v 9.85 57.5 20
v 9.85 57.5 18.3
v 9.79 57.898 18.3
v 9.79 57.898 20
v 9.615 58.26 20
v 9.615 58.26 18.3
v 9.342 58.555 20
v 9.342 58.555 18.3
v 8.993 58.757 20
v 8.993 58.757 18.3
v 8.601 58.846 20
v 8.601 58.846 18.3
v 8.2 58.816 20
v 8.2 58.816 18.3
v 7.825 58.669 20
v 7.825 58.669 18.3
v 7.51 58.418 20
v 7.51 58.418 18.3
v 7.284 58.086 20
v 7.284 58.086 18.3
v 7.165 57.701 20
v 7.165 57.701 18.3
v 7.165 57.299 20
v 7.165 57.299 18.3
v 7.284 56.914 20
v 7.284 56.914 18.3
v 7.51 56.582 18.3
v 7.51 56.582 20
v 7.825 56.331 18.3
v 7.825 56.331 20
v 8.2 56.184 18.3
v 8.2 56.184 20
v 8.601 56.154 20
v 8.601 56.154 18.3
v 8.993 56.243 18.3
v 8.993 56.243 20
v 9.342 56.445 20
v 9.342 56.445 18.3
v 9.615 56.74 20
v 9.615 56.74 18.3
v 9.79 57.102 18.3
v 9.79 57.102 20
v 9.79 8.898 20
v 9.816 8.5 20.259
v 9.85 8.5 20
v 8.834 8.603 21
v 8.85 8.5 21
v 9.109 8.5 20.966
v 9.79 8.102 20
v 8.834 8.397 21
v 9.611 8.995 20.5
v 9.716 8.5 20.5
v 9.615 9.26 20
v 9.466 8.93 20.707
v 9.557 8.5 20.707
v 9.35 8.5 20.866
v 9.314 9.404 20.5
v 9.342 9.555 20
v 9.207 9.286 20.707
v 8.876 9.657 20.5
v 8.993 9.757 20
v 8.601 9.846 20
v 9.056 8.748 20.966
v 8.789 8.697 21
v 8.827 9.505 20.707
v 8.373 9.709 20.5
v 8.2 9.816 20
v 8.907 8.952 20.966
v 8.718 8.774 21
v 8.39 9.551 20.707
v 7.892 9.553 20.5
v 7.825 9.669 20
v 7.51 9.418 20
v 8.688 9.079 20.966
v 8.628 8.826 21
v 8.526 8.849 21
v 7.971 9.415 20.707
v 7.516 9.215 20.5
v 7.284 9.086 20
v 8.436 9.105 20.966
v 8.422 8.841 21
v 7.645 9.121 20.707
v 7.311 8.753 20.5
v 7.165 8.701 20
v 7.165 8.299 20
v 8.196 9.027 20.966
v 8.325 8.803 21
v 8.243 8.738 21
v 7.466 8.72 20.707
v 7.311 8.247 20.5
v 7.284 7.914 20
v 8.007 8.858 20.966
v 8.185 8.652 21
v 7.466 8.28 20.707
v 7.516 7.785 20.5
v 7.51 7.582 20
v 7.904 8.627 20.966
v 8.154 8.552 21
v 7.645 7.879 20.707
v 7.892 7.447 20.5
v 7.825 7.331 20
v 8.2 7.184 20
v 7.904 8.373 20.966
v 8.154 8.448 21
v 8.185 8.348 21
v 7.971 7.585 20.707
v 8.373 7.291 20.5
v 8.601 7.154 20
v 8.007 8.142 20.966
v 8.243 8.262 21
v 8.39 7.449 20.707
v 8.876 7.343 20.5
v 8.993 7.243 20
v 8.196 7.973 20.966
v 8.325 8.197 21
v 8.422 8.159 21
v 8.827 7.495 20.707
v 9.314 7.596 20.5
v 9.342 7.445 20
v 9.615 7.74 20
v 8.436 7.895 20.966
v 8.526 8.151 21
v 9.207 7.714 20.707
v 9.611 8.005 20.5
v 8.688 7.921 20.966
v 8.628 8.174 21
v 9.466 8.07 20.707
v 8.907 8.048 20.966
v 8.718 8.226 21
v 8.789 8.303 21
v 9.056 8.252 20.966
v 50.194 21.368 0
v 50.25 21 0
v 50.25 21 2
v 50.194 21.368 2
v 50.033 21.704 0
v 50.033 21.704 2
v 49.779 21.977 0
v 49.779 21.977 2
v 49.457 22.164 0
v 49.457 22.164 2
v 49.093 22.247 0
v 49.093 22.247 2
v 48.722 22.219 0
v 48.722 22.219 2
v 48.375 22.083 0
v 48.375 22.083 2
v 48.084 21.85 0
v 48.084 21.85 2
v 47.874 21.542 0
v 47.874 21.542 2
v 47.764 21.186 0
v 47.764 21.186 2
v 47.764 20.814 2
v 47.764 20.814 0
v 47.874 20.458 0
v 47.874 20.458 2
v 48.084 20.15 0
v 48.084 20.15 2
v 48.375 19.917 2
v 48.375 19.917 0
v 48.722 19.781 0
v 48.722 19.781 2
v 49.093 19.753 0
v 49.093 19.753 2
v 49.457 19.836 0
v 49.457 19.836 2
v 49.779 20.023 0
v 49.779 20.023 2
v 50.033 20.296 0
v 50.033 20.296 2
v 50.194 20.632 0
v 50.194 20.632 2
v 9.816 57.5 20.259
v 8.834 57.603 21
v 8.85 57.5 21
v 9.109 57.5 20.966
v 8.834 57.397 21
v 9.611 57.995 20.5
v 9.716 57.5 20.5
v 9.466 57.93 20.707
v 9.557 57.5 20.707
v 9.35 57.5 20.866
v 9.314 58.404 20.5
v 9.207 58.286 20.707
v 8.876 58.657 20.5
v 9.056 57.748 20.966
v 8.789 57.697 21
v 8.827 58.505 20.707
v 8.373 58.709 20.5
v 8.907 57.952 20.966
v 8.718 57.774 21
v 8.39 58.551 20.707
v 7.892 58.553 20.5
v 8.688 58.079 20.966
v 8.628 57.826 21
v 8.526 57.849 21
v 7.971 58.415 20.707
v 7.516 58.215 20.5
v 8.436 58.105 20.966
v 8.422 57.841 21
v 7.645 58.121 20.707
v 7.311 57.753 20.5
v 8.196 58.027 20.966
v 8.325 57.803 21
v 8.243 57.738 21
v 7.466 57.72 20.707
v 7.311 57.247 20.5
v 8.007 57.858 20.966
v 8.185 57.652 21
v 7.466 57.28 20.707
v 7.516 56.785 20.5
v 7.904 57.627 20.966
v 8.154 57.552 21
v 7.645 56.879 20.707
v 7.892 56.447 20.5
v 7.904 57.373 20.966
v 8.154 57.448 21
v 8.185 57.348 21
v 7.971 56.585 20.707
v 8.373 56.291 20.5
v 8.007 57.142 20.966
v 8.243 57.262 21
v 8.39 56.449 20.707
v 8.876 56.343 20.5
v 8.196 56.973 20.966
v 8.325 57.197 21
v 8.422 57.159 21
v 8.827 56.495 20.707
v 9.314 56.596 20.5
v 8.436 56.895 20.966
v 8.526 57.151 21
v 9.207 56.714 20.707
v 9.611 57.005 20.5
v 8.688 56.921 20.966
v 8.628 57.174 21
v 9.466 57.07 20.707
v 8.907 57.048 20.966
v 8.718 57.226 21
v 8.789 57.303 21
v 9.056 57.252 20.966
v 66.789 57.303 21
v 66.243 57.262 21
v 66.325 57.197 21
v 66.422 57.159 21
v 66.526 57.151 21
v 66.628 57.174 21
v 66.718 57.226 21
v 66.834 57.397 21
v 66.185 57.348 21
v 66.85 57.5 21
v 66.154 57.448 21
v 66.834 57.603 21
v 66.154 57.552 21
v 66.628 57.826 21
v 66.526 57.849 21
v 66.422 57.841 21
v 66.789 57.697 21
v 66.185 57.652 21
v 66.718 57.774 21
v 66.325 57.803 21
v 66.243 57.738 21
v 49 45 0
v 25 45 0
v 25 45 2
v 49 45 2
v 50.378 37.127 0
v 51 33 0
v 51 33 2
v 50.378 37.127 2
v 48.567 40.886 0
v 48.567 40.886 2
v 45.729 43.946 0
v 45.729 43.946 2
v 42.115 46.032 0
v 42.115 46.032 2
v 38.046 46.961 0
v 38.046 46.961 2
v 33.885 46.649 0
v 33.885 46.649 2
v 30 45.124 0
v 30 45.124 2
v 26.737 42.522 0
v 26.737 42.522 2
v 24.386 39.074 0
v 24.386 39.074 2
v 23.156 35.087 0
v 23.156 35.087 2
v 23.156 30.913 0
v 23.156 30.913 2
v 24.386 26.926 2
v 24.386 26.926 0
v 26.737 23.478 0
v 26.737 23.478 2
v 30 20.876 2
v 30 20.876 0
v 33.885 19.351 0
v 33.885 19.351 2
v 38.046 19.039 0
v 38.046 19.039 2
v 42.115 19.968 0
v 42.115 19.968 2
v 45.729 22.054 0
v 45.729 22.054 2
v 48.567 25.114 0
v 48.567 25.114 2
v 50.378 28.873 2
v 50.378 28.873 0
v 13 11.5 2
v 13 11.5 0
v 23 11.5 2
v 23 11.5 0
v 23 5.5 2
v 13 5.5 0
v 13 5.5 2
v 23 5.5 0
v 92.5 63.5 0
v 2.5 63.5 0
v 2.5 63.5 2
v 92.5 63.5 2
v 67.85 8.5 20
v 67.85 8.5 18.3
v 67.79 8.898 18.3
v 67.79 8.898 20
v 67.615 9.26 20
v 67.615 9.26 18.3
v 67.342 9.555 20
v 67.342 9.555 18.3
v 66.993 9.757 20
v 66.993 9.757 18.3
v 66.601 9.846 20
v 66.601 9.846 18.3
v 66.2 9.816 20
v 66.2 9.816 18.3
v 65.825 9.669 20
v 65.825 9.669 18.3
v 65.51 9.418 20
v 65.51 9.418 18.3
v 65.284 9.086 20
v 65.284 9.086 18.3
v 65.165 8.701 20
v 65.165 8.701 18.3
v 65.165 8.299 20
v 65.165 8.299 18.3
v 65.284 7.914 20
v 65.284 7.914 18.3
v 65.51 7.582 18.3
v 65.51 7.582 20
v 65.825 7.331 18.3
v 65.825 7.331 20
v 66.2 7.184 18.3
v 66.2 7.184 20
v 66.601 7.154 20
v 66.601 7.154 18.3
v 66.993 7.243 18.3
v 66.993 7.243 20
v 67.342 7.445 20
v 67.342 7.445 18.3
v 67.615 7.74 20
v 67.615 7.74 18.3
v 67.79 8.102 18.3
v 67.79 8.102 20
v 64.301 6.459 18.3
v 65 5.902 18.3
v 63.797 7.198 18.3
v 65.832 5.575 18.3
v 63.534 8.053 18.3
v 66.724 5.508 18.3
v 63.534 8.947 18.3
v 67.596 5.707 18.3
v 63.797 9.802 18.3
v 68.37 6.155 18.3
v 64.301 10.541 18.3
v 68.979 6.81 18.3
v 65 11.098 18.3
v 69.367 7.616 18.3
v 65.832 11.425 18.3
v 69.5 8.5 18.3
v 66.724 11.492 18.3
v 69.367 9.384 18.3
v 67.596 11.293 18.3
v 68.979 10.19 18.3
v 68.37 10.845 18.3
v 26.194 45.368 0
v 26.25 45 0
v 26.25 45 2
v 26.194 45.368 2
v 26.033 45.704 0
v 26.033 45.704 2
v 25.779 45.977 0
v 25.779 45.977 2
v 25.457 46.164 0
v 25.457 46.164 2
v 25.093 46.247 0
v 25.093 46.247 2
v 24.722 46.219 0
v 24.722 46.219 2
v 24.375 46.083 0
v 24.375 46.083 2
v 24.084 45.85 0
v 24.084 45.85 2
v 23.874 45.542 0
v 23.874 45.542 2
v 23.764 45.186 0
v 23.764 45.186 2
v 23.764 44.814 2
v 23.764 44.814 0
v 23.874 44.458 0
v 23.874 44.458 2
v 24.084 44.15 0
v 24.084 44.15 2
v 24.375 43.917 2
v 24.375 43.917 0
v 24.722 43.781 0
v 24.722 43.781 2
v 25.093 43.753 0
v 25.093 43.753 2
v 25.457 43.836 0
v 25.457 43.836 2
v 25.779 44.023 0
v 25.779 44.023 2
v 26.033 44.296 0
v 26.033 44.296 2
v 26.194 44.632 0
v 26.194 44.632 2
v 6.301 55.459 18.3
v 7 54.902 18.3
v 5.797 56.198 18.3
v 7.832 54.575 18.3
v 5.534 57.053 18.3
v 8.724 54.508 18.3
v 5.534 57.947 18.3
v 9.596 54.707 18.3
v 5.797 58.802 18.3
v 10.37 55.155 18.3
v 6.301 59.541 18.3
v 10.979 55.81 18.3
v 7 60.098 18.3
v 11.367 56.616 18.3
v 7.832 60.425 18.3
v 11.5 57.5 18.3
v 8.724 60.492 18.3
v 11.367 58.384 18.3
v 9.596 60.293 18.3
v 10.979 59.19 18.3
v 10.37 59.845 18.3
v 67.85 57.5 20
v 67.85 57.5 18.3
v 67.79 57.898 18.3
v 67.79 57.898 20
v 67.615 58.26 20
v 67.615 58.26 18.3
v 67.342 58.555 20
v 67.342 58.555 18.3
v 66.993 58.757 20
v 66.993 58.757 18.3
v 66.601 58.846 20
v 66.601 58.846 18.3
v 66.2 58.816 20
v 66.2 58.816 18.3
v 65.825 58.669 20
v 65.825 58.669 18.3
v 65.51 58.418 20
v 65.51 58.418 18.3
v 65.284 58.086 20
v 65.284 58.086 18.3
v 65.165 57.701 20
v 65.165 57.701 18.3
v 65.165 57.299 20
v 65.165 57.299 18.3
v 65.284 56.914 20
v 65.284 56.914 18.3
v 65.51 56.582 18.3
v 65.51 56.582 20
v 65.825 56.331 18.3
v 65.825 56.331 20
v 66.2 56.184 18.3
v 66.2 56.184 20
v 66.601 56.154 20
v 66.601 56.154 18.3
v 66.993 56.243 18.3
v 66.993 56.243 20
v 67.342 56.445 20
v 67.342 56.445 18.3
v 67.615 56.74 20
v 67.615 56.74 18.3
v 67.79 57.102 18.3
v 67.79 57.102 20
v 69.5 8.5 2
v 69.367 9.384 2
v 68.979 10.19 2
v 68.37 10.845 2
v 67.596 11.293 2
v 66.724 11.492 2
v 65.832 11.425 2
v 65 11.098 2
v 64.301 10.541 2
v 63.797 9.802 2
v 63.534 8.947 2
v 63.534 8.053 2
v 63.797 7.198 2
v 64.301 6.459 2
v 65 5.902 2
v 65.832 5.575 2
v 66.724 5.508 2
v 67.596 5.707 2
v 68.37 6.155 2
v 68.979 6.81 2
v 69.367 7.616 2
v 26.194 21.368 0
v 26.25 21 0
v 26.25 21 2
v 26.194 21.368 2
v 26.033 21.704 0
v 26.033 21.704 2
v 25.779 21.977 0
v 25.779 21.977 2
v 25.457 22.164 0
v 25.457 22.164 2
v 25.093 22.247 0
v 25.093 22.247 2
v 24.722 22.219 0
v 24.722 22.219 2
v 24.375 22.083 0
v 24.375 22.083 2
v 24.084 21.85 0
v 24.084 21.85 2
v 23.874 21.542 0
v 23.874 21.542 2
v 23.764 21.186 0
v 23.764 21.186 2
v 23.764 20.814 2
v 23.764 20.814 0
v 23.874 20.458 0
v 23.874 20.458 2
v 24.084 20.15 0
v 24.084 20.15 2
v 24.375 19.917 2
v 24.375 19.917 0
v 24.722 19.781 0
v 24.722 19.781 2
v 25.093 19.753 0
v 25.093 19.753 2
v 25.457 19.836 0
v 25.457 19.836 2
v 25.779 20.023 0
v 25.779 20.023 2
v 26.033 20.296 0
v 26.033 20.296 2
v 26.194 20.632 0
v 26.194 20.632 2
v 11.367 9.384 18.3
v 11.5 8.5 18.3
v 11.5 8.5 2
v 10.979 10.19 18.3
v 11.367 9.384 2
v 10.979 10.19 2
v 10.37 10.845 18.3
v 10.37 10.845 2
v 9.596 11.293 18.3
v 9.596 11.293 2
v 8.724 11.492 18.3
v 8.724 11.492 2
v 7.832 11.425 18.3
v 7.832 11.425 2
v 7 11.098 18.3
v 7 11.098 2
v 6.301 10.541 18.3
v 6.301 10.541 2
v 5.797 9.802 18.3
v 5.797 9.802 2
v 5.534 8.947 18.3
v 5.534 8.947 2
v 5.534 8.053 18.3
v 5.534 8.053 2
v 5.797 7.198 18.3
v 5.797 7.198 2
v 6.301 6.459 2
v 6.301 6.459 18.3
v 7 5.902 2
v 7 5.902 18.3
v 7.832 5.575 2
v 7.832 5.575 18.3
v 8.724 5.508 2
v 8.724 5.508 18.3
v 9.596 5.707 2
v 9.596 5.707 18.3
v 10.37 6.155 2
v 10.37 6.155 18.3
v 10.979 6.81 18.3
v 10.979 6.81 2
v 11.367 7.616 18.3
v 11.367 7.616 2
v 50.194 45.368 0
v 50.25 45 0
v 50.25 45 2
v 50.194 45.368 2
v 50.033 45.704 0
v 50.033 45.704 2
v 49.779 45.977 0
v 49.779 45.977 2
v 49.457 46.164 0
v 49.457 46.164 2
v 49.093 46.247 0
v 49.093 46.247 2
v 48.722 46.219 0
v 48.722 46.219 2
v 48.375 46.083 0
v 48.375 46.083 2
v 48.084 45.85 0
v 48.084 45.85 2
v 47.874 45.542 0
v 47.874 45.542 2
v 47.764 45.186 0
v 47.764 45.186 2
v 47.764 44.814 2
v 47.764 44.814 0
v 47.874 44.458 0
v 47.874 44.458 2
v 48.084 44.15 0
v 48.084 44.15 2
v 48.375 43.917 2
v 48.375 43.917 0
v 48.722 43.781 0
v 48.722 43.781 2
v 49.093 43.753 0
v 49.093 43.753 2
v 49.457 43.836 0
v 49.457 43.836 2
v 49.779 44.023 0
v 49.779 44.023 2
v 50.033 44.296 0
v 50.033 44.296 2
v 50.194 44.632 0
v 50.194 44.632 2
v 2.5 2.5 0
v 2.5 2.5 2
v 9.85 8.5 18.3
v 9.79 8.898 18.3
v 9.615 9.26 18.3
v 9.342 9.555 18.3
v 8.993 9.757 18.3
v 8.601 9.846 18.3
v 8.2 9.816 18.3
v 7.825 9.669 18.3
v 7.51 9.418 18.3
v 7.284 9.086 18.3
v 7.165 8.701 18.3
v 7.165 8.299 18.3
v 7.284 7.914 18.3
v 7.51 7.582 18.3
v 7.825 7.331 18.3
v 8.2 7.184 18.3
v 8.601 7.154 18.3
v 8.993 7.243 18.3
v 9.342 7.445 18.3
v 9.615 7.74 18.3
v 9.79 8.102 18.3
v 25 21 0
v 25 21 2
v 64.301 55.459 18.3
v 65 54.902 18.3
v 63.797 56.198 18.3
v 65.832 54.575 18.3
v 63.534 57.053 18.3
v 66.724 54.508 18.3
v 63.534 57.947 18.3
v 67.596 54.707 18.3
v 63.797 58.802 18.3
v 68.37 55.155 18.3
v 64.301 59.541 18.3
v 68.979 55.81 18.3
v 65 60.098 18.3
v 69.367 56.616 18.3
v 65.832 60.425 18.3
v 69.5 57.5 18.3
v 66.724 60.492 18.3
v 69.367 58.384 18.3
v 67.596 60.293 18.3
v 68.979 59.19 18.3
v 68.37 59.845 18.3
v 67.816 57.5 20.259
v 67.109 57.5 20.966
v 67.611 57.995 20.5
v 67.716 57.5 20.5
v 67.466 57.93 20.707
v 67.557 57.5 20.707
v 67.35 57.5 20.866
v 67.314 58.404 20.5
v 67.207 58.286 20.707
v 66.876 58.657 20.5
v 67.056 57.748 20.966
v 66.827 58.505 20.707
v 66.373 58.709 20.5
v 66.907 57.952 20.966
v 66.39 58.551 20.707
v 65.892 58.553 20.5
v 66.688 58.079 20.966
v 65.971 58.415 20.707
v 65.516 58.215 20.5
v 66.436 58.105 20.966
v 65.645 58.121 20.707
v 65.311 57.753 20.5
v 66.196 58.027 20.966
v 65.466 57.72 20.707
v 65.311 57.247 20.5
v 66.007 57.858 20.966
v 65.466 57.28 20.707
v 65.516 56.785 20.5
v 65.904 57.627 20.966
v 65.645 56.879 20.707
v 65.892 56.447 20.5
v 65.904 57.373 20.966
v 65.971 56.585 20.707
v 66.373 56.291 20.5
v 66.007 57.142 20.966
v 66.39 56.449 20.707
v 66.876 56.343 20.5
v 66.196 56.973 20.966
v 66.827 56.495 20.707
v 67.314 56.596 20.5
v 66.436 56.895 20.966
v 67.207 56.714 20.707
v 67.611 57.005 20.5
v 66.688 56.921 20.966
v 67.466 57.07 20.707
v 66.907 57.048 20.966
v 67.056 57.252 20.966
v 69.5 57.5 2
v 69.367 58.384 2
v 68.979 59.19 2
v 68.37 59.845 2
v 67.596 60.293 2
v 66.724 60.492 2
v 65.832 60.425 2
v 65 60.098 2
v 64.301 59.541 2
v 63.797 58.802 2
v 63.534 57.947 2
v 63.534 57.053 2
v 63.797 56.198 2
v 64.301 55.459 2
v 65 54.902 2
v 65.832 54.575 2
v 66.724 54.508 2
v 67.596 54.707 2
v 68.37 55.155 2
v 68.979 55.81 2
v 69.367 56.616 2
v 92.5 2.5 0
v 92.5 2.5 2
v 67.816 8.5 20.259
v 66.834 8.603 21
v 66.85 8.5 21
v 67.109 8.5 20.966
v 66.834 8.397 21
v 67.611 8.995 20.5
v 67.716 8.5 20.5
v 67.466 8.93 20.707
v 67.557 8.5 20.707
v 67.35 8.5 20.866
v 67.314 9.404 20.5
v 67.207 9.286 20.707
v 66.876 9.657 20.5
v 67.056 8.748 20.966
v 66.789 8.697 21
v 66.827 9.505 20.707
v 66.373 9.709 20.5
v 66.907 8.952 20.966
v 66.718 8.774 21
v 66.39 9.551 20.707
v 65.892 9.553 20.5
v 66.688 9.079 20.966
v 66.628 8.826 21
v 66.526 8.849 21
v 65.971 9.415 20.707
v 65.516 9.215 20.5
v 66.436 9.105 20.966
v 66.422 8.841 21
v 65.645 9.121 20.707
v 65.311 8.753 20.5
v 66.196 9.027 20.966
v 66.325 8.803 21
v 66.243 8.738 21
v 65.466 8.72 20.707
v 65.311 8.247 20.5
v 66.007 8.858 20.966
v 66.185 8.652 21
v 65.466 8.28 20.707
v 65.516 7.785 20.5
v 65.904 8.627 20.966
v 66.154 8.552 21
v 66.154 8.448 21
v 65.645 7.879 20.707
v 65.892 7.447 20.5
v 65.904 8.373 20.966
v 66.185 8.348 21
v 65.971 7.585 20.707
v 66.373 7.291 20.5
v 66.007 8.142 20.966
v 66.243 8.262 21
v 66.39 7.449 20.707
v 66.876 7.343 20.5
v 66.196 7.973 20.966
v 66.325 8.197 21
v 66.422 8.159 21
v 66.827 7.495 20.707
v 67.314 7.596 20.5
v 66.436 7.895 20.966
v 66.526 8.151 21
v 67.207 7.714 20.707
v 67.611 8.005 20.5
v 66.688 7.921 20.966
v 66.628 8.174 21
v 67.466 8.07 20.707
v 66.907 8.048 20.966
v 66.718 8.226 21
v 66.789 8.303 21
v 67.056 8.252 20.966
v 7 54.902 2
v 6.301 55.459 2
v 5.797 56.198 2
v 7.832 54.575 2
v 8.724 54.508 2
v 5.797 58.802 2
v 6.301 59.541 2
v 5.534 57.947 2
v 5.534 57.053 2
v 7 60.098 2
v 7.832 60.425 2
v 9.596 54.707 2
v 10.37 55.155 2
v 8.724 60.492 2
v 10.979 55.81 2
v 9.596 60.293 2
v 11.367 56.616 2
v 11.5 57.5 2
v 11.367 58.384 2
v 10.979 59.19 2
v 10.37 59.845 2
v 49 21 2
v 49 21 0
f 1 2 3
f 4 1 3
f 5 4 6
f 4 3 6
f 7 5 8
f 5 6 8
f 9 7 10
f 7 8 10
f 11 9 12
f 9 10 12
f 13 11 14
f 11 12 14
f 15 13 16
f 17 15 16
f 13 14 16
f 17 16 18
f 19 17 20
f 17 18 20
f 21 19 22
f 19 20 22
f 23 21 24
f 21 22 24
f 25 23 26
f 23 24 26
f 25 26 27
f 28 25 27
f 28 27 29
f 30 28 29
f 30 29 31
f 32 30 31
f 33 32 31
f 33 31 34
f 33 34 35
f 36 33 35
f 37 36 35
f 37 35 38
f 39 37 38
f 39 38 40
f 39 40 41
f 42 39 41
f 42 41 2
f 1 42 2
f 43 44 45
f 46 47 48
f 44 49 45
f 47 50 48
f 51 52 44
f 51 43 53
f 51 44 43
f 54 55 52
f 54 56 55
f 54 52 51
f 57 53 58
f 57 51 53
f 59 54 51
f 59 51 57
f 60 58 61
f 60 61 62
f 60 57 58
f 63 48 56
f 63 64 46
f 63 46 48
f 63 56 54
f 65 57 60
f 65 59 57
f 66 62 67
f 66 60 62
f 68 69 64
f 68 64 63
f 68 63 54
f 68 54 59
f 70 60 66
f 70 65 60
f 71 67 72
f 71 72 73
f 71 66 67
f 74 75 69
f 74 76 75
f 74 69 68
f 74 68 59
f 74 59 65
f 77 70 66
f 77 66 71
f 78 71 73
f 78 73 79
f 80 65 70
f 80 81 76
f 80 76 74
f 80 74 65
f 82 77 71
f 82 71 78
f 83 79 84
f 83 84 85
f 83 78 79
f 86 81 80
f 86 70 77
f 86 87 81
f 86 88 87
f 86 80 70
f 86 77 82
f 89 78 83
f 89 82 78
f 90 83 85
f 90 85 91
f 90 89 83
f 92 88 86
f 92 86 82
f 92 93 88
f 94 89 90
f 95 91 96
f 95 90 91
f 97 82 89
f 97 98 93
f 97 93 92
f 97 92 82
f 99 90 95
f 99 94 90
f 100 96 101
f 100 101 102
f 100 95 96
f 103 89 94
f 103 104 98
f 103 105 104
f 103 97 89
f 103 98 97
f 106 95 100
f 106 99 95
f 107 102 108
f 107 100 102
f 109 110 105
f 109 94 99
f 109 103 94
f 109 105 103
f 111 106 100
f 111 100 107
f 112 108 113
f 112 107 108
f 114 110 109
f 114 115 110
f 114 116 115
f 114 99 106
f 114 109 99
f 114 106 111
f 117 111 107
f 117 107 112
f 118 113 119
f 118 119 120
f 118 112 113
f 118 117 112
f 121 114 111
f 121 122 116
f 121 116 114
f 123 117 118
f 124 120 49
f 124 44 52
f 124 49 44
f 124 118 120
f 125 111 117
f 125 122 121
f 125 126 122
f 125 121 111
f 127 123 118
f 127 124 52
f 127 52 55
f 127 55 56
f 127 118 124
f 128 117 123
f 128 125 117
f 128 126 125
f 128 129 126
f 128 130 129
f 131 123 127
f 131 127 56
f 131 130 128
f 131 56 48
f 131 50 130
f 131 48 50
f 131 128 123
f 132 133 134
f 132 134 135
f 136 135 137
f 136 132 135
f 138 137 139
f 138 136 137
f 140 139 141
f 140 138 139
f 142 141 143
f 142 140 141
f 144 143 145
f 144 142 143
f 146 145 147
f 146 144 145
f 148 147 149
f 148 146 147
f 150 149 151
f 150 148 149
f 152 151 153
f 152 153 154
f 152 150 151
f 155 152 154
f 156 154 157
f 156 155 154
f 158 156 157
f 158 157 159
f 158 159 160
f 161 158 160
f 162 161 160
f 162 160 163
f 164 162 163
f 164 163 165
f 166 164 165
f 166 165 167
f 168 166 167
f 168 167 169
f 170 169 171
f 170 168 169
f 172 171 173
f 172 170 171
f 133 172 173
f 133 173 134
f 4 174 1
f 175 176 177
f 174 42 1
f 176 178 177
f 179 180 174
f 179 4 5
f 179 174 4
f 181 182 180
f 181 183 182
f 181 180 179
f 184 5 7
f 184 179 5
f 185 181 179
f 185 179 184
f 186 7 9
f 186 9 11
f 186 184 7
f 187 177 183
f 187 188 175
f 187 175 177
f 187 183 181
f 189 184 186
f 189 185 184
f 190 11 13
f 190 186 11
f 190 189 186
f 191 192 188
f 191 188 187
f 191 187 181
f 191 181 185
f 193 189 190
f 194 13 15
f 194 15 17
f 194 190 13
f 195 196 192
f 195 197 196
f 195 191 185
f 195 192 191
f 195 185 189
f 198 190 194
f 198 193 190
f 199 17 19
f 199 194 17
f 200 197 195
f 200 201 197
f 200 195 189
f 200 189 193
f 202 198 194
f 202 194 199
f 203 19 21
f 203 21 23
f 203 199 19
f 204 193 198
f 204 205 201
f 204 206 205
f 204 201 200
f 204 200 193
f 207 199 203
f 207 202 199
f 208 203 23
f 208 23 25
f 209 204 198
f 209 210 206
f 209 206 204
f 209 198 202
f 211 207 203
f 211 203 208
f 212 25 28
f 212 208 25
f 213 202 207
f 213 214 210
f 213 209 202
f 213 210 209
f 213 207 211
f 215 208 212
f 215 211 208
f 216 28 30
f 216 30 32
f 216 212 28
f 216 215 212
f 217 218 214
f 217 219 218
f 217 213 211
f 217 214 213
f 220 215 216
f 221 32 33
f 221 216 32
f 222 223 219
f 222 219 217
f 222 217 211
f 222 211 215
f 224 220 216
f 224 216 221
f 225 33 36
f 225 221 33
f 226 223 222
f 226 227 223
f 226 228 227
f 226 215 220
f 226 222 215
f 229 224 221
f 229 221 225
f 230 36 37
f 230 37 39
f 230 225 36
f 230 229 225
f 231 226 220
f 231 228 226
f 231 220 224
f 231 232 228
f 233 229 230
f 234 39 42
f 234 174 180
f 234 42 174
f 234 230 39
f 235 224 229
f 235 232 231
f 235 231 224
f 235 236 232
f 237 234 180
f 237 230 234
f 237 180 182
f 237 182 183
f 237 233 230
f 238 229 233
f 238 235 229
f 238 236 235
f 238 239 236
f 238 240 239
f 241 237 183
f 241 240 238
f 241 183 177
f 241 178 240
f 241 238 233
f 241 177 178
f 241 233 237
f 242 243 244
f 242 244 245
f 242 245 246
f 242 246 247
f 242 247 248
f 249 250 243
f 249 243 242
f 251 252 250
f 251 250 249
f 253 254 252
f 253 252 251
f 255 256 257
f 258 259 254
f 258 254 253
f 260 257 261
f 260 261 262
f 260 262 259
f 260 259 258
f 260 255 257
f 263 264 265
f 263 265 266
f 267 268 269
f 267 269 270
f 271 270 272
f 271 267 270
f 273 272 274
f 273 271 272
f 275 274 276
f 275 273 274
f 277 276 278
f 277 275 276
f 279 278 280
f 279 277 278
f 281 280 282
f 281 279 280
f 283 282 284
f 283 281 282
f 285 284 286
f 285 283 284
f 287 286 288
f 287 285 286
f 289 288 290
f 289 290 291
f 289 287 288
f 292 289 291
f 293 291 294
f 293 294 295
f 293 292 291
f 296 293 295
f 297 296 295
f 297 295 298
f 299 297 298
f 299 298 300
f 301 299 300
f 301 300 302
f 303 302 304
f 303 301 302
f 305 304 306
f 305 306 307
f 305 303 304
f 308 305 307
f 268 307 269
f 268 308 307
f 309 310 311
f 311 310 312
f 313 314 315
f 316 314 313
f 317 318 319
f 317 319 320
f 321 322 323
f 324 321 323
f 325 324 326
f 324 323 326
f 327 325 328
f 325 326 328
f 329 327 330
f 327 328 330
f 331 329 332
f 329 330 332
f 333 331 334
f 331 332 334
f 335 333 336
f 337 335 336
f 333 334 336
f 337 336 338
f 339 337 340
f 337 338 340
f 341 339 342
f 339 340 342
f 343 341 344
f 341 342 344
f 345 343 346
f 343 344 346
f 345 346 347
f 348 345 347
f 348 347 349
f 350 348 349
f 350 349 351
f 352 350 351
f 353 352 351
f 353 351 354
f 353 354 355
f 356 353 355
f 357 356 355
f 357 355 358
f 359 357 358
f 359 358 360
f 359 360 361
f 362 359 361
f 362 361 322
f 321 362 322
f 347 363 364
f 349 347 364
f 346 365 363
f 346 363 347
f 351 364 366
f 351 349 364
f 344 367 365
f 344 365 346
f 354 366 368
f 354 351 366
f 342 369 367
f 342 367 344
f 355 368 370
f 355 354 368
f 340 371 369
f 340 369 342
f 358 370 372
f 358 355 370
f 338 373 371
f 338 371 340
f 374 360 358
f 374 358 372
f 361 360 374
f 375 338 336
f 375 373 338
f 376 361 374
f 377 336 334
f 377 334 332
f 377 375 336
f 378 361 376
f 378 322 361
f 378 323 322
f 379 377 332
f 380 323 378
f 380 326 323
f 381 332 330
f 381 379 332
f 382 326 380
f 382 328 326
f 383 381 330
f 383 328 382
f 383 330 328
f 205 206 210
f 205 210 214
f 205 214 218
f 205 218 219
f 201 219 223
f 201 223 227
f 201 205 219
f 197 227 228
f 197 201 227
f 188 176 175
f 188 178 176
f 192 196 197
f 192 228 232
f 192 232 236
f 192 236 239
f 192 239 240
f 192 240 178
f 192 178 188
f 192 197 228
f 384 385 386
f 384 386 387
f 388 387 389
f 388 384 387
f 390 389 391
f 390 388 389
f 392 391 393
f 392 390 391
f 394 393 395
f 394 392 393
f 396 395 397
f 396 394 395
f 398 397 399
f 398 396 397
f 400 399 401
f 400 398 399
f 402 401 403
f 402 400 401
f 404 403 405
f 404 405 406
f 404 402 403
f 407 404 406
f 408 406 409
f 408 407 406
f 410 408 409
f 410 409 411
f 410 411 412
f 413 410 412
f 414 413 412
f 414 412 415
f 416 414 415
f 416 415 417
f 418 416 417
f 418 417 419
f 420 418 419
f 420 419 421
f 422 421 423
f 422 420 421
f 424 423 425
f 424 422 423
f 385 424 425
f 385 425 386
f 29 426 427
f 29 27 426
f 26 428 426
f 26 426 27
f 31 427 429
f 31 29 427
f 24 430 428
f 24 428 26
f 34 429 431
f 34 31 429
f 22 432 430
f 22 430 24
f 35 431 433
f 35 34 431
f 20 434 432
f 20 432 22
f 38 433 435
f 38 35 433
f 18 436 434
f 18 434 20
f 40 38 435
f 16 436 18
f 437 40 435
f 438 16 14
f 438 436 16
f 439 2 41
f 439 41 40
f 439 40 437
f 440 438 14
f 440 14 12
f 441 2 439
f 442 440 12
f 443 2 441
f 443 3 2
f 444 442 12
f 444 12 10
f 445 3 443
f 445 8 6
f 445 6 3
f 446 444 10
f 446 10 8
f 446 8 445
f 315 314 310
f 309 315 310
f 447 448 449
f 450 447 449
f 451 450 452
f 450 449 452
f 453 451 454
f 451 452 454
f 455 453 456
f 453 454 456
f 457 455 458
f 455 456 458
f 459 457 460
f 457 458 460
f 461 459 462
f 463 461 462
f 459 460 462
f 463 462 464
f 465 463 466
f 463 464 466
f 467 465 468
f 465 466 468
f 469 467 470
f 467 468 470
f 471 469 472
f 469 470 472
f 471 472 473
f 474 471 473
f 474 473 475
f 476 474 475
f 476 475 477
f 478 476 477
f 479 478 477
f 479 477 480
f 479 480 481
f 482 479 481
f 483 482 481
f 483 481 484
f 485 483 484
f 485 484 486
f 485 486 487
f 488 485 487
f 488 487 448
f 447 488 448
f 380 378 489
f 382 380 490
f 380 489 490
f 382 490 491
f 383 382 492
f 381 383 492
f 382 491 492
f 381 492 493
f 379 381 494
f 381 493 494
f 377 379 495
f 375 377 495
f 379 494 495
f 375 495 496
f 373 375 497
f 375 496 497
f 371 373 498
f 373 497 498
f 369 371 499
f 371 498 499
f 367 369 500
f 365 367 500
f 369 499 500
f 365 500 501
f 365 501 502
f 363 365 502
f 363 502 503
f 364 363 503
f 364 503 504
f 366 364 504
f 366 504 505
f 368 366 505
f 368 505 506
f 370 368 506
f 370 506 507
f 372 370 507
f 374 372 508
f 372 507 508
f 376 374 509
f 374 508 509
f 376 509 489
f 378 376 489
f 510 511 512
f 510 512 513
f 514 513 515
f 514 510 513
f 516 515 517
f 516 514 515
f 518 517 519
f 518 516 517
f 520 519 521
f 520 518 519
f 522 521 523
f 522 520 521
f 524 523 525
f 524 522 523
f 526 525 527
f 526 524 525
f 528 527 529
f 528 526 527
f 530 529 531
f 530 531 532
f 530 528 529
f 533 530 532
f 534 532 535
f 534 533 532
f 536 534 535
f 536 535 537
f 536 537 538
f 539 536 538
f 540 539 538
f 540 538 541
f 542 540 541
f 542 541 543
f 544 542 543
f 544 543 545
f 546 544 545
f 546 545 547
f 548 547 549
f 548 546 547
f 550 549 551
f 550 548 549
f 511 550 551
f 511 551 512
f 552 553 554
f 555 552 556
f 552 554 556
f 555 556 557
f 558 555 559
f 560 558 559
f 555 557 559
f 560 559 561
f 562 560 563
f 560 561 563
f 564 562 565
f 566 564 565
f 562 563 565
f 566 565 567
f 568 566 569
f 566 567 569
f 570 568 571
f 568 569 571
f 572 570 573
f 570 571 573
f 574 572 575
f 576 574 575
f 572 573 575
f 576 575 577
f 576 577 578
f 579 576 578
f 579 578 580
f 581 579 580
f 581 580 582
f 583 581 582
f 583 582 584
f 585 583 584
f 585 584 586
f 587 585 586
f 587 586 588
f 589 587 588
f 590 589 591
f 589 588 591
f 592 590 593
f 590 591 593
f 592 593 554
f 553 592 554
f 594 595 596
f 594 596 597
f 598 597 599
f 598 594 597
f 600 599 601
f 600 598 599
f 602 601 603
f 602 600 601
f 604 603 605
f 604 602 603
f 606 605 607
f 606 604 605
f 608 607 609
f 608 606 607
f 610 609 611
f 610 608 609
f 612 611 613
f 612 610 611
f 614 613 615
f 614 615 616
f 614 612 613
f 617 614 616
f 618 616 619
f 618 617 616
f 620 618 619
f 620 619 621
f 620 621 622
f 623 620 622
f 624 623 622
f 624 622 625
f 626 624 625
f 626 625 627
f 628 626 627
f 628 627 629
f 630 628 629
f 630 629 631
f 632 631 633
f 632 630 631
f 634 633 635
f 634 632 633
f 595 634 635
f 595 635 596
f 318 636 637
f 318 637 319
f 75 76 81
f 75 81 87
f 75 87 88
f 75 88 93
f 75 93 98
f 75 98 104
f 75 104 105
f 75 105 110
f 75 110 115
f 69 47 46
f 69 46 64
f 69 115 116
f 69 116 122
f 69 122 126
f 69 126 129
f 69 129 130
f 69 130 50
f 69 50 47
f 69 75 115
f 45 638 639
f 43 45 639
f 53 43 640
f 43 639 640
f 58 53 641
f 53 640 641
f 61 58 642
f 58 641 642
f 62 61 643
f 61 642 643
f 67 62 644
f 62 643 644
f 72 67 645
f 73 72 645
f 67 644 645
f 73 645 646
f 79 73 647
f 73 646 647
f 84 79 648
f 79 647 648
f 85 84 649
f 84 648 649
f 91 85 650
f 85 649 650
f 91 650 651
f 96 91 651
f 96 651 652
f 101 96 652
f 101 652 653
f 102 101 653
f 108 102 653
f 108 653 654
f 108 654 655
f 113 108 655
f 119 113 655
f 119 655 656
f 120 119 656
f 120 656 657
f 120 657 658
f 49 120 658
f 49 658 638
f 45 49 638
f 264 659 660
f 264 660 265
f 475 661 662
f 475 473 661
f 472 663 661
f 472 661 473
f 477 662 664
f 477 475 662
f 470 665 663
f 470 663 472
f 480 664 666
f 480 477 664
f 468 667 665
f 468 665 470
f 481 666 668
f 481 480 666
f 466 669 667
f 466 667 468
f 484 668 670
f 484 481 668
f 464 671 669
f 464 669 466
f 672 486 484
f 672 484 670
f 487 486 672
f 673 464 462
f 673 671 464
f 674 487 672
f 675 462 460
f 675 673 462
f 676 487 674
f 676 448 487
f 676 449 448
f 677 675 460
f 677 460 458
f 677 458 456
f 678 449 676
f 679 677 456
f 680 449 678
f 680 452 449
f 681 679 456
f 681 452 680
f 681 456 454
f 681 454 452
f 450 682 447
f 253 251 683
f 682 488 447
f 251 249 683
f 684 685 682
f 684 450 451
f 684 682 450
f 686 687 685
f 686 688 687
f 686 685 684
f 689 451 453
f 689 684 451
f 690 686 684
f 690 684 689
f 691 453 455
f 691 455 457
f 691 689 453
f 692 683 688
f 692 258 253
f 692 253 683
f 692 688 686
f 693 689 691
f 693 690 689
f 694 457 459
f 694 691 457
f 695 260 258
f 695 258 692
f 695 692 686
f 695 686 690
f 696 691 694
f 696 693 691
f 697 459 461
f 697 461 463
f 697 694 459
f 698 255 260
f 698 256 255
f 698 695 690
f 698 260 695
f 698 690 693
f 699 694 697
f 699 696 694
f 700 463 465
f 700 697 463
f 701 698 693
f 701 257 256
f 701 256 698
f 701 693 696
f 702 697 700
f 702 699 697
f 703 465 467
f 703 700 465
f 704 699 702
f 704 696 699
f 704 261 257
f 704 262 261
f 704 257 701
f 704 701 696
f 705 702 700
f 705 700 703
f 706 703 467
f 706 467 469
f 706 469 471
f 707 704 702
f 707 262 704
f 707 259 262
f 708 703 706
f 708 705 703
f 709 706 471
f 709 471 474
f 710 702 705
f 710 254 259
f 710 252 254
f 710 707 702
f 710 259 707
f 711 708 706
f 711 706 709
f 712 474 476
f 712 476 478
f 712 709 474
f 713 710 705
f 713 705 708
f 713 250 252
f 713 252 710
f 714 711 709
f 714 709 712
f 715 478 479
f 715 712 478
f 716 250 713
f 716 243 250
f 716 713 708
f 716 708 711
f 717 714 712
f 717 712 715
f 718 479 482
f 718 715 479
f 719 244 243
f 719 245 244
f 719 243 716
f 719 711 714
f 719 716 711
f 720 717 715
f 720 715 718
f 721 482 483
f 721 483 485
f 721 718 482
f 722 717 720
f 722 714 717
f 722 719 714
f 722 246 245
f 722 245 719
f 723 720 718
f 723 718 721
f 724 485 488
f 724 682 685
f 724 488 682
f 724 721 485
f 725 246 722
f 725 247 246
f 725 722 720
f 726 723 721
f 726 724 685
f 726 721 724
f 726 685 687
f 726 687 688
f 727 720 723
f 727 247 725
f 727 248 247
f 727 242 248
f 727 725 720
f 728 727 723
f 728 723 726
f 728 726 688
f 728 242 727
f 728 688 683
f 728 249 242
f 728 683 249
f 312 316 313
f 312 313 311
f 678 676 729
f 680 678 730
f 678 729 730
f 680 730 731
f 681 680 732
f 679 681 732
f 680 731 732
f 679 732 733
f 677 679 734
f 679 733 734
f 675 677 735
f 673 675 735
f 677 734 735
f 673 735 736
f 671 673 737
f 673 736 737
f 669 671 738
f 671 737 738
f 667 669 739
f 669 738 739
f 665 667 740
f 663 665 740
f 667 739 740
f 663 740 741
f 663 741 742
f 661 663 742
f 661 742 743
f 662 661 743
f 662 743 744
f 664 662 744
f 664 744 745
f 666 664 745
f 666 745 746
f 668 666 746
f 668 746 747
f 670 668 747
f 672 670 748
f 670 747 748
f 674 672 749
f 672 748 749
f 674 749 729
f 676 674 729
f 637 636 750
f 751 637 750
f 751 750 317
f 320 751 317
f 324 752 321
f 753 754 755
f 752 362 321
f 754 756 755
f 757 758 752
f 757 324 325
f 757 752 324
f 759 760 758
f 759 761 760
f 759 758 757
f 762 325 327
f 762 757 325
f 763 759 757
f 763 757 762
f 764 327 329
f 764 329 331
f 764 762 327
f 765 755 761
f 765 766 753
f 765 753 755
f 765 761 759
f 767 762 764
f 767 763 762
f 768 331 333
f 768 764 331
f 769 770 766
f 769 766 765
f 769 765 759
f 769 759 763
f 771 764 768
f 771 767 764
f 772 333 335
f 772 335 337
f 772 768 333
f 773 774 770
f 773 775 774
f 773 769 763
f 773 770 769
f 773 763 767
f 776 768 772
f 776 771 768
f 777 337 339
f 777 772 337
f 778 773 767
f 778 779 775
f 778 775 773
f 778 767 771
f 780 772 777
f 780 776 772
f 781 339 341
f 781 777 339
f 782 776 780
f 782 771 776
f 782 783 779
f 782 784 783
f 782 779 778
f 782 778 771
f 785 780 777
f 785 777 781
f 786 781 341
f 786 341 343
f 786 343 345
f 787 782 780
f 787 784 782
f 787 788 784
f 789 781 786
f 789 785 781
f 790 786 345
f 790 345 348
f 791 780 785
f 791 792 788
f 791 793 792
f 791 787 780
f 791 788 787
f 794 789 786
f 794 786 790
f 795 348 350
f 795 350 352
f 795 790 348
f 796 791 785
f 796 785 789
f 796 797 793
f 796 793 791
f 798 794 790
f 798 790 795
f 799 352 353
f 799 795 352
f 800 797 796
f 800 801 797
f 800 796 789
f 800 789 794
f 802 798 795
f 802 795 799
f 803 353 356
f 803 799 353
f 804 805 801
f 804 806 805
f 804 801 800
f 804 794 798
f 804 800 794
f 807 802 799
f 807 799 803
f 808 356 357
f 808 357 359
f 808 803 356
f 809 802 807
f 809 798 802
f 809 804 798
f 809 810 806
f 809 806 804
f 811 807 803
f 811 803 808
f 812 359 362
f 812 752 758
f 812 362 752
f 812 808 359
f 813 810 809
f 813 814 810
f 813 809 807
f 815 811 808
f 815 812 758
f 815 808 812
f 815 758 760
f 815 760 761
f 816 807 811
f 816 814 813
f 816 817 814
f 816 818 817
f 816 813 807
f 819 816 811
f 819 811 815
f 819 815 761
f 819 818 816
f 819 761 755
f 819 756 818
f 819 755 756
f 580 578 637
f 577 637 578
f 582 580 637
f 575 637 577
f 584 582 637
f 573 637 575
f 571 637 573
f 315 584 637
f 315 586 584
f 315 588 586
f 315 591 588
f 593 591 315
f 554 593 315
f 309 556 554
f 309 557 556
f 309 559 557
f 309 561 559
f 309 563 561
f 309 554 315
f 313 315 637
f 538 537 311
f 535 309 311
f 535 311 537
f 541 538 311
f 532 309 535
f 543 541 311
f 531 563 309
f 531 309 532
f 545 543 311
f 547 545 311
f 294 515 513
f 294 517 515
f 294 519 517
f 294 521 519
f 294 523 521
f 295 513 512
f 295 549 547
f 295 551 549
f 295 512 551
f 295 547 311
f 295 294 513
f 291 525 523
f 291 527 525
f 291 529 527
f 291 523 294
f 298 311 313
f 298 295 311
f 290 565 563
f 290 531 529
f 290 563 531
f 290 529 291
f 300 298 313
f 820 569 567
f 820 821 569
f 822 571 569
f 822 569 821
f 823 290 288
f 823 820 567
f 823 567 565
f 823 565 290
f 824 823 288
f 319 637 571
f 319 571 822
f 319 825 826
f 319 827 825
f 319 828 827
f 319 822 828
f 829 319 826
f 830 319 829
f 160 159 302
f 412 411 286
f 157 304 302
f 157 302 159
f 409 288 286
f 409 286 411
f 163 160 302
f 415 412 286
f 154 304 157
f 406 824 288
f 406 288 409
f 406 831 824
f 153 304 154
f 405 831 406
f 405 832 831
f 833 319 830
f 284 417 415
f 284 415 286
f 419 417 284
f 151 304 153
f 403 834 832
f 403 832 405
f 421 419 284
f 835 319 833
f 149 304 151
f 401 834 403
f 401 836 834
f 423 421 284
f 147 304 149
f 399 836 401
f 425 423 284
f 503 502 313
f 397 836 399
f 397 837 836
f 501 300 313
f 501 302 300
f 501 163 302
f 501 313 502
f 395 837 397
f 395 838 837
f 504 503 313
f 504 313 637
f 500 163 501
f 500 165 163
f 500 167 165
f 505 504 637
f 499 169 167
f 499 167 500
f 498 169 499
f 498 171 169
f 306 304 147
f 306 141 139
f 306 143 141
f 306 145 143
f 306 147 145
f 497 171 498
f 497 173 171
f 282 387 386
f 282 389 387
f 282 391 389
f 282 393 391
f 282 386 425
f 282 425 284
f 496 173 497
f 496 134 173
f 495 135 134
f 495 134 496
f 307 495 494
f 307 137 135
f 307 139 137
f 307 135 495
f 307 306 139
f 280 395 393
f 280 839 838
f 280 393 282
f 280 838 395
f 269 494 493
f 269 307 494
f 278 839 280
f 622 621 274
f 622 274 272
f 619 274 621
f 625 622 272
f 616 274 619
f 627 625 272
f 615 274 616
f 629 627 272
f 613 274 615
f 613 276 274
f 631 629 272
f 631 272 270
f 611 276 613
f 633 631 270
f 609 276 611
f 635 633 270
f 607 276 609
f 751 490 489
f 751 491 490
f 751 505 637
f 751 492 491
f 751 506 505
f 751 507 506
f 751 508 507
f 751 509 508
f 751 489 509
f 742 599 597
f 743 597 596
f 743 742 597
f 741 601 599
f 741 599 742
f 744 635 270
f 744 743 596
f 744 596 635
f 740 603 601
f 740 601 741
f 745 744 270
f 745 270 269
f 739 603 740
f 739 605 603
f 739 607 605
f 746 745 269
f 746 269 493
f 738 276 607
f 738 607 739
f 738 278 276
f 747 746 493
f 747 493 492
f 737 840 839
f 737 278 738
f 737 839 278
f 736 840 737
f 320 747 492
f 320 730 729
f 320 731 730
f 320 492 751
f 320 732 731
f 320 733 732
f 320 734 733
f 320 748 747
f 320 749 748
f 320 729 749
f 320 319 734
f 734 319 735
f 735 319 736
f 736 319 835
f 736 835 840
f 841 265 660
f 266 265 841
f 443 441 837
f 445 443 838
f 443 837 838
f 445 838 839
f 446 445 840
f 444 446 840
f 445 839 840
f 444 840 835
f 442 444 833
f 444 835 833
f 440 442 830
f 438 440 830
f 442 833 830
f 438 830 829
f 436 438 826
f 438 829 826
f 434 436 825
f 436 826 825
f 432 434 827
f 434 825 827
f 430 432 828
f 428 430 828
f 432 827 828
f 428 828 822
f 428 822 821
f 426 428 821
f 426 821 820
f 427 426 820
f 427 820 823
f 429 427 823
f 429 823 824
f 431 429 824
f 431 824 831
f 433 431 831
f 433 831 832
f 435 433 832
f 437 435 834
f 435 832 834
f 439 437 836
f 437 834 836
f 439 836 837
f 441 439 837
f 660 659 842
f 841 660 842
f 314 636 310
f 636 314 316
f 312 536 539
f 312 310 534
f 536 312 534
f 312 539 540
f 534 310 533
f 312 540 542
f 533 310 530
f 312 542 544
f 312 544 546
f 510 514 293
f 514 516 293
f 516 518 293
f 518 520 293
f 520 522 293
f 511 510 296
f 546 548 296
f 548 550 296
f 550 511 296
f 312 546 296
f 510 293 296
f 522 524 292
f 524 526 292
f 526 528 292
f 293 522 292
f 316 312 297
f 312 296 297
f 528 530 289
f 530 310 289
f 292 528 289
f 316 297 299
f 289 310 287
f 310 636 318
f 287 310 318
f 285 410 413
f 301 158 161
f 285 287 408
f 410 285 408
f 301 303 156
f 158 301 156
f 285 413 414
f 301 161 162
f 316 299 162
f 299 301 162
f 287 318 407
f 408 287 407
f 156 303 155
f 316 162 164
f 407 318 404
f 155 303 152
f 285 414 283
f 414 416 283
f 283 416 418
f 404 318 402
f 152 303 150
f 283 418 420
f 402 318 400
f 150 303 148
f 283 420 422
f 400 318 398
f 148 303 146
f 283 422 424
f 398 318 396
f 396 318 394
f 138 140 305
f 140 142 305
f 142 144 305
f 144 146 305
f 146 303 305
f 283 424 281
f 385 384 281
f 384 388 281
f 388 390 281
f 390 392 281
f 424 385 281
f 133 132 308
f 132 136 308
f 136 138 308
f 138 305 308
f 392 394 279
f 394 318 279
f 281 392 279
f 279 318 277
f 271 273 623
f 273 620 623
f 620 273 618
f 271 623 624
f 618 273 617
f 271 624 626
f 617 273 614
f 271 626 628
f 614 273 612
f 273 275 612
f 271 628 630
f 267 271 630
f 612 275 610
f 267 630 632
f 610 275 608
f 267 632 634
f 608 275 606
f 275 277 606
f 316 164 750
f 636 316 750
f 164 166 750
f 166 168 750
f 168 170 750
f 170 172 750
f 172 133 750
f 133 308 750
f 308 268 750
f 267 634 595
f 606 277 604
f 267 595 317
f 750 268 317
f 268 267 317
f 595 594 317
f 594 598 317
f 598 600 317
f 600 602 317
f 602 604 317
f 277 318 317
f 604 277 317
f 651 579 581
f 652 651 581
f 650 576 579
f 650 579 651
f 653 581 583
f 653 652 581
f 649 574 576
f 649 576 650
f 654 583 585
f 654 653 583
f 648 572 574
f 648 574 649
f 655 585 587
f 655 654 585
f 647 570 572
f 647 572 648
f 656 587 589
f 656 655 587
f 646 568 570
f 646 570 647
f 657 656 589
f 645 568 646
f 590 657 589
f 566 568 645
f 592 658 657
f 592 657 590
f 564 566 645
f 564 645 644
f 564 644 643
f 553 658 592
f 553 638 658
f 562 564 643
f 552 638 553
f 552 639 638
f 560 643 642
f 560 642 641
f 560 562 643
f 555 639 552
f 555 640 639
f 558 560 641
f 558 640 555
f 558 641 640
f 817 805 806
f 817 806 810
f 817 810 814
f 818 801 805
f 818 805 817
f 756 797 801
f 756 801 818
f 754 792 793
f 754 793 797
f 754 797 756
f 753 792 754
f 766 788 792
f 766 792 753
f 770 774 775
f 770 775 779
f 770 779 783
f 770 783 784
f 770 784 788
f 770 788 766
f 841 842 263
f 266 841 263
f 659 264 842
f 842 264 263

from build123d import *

# Parameters (mm, degrees)
BOX001_W          = 24
BOX001_H          = 24
BOX001_DEPTH      = 2
CYLINDER012_R     = 1.25
CYLINDER012_DEPTH = 2
CYLINDER013_R     = 1.25
CYLINDER013_DEPTH = 2
CYLINDER014_R     = 1.25
CYLINDER014_DEPTH = 2
CYLINDER015_R     = 1.25
CYLINDER015_DEPTH = 2
BOX002_W          = 10
BOX002_H          = 6
BOX002_DEPTH      = 2
CYLINDER016_R     = 14
CYLINDER016_DEPTH = 2
CYLINDER002_R     = 1
CYLINDER002_DEPTH = 5
CYLINDER003_R     = 3
CYLINDER003_DEPTH = 16.3
CYLINDER004_R     = 1
CYLINDER004_DEPTH = 5
CYLINDER005_R     = 3
CYLINDER005_DEPTH = 16.3
CYLINDER006_R     = 1
CYLINDER006_DEPTH = 5
CYLINDER007_R     = 3
CYLINDER007_DEPTH = 16.3
CYLINDER001_R     = 1
CYLINDER001_DEPTH = 5
CYLINDER_R        = 3
CYLINDER_DEPTH    = 16.3
CYLINDER008_R     = 1.35
CYLINDER008_DEPTH = 21
FILLET_R          = 1
CYLINDER009_R     = 1.35
CYLINDER009_DEPTH = 21
FILLET001_R       = 1
CYLINDER010_R     = 1.35
CYLINDER010_DEPTH = 21
FILLET002_R       = 1
CYLINDER011_R     = 1.35
CYLINDER011_DEPTH = 21
FILLET003_R       = 1
BOX_W             = 90
BOX_H             = 61
BOX_DEPTH         = 2


with BuildPart() as cube:
    # Box001 → Box001 (new body)
    with BuildSketch(Plane(origin=(25, 21, 0), x_dir=(1, 0, 0), z_dir=(0, 0, 1))):
        with Locations((12, 12)):
            Rectangle(BOX001_W, BOX001_H)
    extrude(amount=BOX001_DEPTH)


with BuildPart() as cylinder012:
    # Cylinder012 → Cylinder012 (new body)
    with BuildSketch(Plane(origin=(25, 21, 0), x_dir=(1, 0, 0), z_dir=(0, 0, 1))):
        Circle(CYLINDER012_R)
    extrude(amount=CYLINDER012_DEPTH)


with BuildPart() as cylinder013:
    # Cylinder013 → Cylinder013 (new body)
    with BuildSketch(Plane(origin=(25, 45, 0), x_dir=(1, 0, 0), z_dir=(0, 0, 1))):
        Circle(CYLINDER013_R)
    extrude(amount=CYLINDER013_DEPTH)


with BuildPart() as cylinder014:
    # Cylinder014 → Cylinder014 (new body)
    with BuildSketch(Plane(origin=(49, 45, 0), x_dir=(1, 0, 0), z_dir=(0, 0, 1))):
        Circle(CYLINDER014_R)
    extrude(amount=CYLINDER014_DEPTH)


with BuildPart() as cylinder015:
    # Cylinder015 → Cylinder015 (new body)
    with BuildSketch(Plane(origin=(49, 21, 0), x_dir=(1, 0, 0), z_dir=(0, 0, 1))):
        Circle(CYLINDER015_R)
    extrude(amount=CYLINDER015_DEPTH)


with BuildPart() as box002:
    # Box002 → Box002 (new body)
    with BuildSketch(Plane(origin=(13, 5.5, 0), x_dir=(1, 0, 0), z_dir=(0, 0, 1))):
        with Locations((5, 3)):
            Rectangle(BOX002_W, BOX002_H)
    extrude(amount=BOX002_DEPTH)


with BuildPart() as fanhole:
    # Cylinder016 → Cylinder016 (new body)
    with BuildSketch(Plane(origin=(37, 33, 0), x_dir=(1, 0, 0), z_dir=(0, 0, 1))):
        Circle(CYLINDER016_R)
    extrude(amount=CYLINDER016_DEPTH)


with BuildPart() as inside_cyl001:
    # Cylinder002 → Cylinder002 (new body)
    with BuildSketch(Plane(origin=(-8.5, 8.5, 0), x_dir=(1, 0, 0), z_dir=(0, 0, 1))):
        Circle(CYLINDER002_R)
    extrude(amount=CYLINDER002_DEPTH)


with BuildPart() as cut001:
    # Cylinder003 → Cylinder003 (new body)
    with BuildSketch(Plane(origin=(-8.5, 8.5, 0), x_dir=(1, 0, 0), z_dir=(0, 0, 1))):
        Circle(CYLINDER003_R)
    extrude(amount=CYLINDER003_DEPTH)

    # Cut001: cut Inside Cyl001
    add(inside_cyl001.part, mode=Mode.SUBTRACT)


with BuildPart() as cut001_1:
    # Cut001 placement: moved
    add(cut001.part.moved(Location((17, 49, 2))))


with BuildPart() as inside_cyl002:
    # Cylinder004 → Cylinder004 (new body)
    with BuildSketch(Plane(origin=(-8.5, 8.5, 0), x_dir=(1, 0, 0), z_dir=(0, 0, 1))):
        Circle(CYLINDER004_R)
    extrude(amount=CYLINDER004_DEPTH)


with BuildPart() as cut002:
    # Cylinder005 → Cylinder005 (new body)
    with BuildSketch(Plane(origin=(-8.5, 8.5, 0), x_dir=(1, 0, 0), z_dir=(0, 0, 1))):
        Circle(CYLINDER005_R)
    extrude(amount=CYLINDER005_DEPTH)

    # Cut002: cut Inside Cyl002
    add(inside_cyl002.part, mode=Mode.SUBTRACT)


with BuildPart() as cut002_1:
    # Cut002 placement: moved
    add(cut002.part.moved(Location((75, 0, 2))))


with BuildPart() as inside_cyl003:
    # Cylinder006 → Cylinder006 (new body)
    with BuildSketch(Plane(origin=(-8.5, 8.5, 0), x_dir=(1, 0, 0), z_dir=(0, 0, 1))):
        Circle(CYLINDER006_R)
    extrude(amount=CYLINDER006_DEPTH)


with BuildPart() as cut003:
    # Cylinder007 → Cylinder007 (new body)
    with BuildSketch(Plane(origin=(-8.5, 8.5, 0), x_dir=(1, 0, 0), z_dir=(0, 0, 1))):
        Circle(CYLINDER007_R)
    extrude(amount=CYLINDER007_DEPTH)

    # Cut003: cut Inside Cyl003
    add(inside_cyl003.part, mode=Mode.SUBTRACT)


with BuildPart() as cut003_1:
    # Cut003 placement: moved
    add(cut003.part.moved(Location((75, 49, 2))))


with BuildPart() as inside_cyl:
    # Cylinder001 → Cylinder001 (new body)
    with BuildSketch(Plane(origin=(-8.5, 8.5, 0), x_dir=(1, 0, 0), z_dir=(0, 0, 1))):
        Circle(CYLINDER001_R)
    extrude(amount=CYLINDER001_DEPTH)


with BuildPart() as cut:
    # Cylinder → Cylinder (new body)
    with BuildSketch(Plane(origin=(-8.5, 8.5, 0), x_dir=(1, 0, 0), z_dir=(0, 0, 1))):
        Circle(CYLINDER_R)
    extrude(amount=CYLINDER_DEPTH)

    # Cut: cut Inside Cyl
    add(inside_cyl.part, mode=Mode.SUBTRACT)


with BuildPart() as cut_1:
    # Cut placement: moved
    add(cut.part.moved(Location((17, 0, 2))))


with BuildPart() as fillet_body:
    # Cylinder008 → Cylinder008 (new body)
    with BuildSketch(Plane(origin=(8.5, 8.5, 0), x_dir=(1, 0, 0), z_dir=(0, 0, 1))):
        Circle(CYLINDER008_R)
    extrude(amount=CYLINDER008_DEPTH)

    # Fillet
    fillet_edges = [fillet_body.edges().sort_by_distance(p)[0] for p in [
        (7.15, 8.5, 21),
    ]]
    fillet(fillet_edges, radius=FILLET_R)


with BuildPart() as fillet001:
    # Cylinder009 → Cylinder009 (new body)
    with BuildSketch(Plane(origin=(8.5, 8.5, 0), x_dir=(1, 0, 0), z_dir=(0, 0, 1))):
        Circle(CYLINDER009_R)
    extrude(amount=CYLINDER009_DEPTH)

    # Fillet001
    fillet001_edges = [fillet001.edges().sort_by_distance(p)[0] for p in [
        (7.15, 8.5, 21),
    ]]
    fillet(fillet001_edges, radius=FILLET001_R)


with BuildPart() as fillet001_1:
    # Fillet001 placement: moved
    add(fillet001.part.moved(Location((0, 49, 0))))


with BuildPart() as fillet002:
    # Cylinder010 → Cylinder010 (new body)
    with BuildSketch(Plane(origin=(8.5, 8.5, 0), x_dir=(1, 0, 0), z_dir=(0, 0, 1))):
        Circle(CYLINDER010_R)
    extrude(amount=CYLINDER010_DEPTH)

    # Fillet002
    fillet002_edges = [fillet002.edges().sort_by_distance(p)[0] for p in [
        (7.15, 8.5, 21),
    ]]
    fillet(fillet002_edges, radius=FILLET002_R)


with BuildPart() as fillet002_1:
    # Fillet002 placement: moved
    add(fillet002.part.moved(Location((58, 0, 0))))


with BuildPart() as fillet003:
    # Cylinder011 → Cylinder011 (new body)
    with BuildSketch(Plane(origin=(8.5, 8.5, 0), x_dir=(1, 0, 0), z_dir=(0, 0, 1))):
        Circle(CYLINDER011_R)
    extrude(amount=CYLINDER011_DEPTH)

    # Fillet003
    fillet003_edges = [fillet003.edges().sort_by_distance(p)[0] for p in [
        (7.15, 8.5, 21),
    ]]
    fillet(fillet003_edges, radius=FILLET003_R)


with BuildPart() as fillet003_1:
    # Fillet003 placement: moved
    add(fillet003.part.moved(Location((58, 49, 0))))


with BuildPart() as rpi_base_top:
    # Box → Box (new body)
    with BuildSketch(Plane(origin=(2.5, 2.5, 0), x_dir=(1, 0, 0), z_dir=(0, 0, 1))):
        with Locations((45, 30.5)):
            Rectangle(BOX_W, BOX_H)
    extrude(amount=BOX_DEPTH)

    # Fusion: union Cut001, Cut002, Cut003, Cut, Fillet body, Fillet001, Fillet002, Fillet003
    add(cut001_1.part)
    add(cut002_1.part)
    add(cut003_1.part)
    add(cut_1.part)
    add(fillet_body.part)
    add(fillet001_1.part)
    add(fillet002_1.part)
    add(fillet003_1.part)

    # Cut004: cut FanHole
    add(fanhole.part, mode=Mode.SUBTRACT)

    # Cut005: cut Box002
    add(box002.part, mode=Mode.SUBTRACT)

    # Cut006: cut Cylinder015
    add(cylinder015.part, mode=Mode.SUBTRACT)

    # Cut007: cut Cylinder014
    add(cylinder014.part, mode=Mode.SUBTRACT)

    # Cut008: cut Cylinder013
    add(cylinder013.part, mode=Mode.SUBTRACT)

    # Cut009: cut Cylinder012
    add(cylinder012.part, mode=Mode.SUBTRACT)


solid = Compound([cube.part, rpi_base_top.part])
